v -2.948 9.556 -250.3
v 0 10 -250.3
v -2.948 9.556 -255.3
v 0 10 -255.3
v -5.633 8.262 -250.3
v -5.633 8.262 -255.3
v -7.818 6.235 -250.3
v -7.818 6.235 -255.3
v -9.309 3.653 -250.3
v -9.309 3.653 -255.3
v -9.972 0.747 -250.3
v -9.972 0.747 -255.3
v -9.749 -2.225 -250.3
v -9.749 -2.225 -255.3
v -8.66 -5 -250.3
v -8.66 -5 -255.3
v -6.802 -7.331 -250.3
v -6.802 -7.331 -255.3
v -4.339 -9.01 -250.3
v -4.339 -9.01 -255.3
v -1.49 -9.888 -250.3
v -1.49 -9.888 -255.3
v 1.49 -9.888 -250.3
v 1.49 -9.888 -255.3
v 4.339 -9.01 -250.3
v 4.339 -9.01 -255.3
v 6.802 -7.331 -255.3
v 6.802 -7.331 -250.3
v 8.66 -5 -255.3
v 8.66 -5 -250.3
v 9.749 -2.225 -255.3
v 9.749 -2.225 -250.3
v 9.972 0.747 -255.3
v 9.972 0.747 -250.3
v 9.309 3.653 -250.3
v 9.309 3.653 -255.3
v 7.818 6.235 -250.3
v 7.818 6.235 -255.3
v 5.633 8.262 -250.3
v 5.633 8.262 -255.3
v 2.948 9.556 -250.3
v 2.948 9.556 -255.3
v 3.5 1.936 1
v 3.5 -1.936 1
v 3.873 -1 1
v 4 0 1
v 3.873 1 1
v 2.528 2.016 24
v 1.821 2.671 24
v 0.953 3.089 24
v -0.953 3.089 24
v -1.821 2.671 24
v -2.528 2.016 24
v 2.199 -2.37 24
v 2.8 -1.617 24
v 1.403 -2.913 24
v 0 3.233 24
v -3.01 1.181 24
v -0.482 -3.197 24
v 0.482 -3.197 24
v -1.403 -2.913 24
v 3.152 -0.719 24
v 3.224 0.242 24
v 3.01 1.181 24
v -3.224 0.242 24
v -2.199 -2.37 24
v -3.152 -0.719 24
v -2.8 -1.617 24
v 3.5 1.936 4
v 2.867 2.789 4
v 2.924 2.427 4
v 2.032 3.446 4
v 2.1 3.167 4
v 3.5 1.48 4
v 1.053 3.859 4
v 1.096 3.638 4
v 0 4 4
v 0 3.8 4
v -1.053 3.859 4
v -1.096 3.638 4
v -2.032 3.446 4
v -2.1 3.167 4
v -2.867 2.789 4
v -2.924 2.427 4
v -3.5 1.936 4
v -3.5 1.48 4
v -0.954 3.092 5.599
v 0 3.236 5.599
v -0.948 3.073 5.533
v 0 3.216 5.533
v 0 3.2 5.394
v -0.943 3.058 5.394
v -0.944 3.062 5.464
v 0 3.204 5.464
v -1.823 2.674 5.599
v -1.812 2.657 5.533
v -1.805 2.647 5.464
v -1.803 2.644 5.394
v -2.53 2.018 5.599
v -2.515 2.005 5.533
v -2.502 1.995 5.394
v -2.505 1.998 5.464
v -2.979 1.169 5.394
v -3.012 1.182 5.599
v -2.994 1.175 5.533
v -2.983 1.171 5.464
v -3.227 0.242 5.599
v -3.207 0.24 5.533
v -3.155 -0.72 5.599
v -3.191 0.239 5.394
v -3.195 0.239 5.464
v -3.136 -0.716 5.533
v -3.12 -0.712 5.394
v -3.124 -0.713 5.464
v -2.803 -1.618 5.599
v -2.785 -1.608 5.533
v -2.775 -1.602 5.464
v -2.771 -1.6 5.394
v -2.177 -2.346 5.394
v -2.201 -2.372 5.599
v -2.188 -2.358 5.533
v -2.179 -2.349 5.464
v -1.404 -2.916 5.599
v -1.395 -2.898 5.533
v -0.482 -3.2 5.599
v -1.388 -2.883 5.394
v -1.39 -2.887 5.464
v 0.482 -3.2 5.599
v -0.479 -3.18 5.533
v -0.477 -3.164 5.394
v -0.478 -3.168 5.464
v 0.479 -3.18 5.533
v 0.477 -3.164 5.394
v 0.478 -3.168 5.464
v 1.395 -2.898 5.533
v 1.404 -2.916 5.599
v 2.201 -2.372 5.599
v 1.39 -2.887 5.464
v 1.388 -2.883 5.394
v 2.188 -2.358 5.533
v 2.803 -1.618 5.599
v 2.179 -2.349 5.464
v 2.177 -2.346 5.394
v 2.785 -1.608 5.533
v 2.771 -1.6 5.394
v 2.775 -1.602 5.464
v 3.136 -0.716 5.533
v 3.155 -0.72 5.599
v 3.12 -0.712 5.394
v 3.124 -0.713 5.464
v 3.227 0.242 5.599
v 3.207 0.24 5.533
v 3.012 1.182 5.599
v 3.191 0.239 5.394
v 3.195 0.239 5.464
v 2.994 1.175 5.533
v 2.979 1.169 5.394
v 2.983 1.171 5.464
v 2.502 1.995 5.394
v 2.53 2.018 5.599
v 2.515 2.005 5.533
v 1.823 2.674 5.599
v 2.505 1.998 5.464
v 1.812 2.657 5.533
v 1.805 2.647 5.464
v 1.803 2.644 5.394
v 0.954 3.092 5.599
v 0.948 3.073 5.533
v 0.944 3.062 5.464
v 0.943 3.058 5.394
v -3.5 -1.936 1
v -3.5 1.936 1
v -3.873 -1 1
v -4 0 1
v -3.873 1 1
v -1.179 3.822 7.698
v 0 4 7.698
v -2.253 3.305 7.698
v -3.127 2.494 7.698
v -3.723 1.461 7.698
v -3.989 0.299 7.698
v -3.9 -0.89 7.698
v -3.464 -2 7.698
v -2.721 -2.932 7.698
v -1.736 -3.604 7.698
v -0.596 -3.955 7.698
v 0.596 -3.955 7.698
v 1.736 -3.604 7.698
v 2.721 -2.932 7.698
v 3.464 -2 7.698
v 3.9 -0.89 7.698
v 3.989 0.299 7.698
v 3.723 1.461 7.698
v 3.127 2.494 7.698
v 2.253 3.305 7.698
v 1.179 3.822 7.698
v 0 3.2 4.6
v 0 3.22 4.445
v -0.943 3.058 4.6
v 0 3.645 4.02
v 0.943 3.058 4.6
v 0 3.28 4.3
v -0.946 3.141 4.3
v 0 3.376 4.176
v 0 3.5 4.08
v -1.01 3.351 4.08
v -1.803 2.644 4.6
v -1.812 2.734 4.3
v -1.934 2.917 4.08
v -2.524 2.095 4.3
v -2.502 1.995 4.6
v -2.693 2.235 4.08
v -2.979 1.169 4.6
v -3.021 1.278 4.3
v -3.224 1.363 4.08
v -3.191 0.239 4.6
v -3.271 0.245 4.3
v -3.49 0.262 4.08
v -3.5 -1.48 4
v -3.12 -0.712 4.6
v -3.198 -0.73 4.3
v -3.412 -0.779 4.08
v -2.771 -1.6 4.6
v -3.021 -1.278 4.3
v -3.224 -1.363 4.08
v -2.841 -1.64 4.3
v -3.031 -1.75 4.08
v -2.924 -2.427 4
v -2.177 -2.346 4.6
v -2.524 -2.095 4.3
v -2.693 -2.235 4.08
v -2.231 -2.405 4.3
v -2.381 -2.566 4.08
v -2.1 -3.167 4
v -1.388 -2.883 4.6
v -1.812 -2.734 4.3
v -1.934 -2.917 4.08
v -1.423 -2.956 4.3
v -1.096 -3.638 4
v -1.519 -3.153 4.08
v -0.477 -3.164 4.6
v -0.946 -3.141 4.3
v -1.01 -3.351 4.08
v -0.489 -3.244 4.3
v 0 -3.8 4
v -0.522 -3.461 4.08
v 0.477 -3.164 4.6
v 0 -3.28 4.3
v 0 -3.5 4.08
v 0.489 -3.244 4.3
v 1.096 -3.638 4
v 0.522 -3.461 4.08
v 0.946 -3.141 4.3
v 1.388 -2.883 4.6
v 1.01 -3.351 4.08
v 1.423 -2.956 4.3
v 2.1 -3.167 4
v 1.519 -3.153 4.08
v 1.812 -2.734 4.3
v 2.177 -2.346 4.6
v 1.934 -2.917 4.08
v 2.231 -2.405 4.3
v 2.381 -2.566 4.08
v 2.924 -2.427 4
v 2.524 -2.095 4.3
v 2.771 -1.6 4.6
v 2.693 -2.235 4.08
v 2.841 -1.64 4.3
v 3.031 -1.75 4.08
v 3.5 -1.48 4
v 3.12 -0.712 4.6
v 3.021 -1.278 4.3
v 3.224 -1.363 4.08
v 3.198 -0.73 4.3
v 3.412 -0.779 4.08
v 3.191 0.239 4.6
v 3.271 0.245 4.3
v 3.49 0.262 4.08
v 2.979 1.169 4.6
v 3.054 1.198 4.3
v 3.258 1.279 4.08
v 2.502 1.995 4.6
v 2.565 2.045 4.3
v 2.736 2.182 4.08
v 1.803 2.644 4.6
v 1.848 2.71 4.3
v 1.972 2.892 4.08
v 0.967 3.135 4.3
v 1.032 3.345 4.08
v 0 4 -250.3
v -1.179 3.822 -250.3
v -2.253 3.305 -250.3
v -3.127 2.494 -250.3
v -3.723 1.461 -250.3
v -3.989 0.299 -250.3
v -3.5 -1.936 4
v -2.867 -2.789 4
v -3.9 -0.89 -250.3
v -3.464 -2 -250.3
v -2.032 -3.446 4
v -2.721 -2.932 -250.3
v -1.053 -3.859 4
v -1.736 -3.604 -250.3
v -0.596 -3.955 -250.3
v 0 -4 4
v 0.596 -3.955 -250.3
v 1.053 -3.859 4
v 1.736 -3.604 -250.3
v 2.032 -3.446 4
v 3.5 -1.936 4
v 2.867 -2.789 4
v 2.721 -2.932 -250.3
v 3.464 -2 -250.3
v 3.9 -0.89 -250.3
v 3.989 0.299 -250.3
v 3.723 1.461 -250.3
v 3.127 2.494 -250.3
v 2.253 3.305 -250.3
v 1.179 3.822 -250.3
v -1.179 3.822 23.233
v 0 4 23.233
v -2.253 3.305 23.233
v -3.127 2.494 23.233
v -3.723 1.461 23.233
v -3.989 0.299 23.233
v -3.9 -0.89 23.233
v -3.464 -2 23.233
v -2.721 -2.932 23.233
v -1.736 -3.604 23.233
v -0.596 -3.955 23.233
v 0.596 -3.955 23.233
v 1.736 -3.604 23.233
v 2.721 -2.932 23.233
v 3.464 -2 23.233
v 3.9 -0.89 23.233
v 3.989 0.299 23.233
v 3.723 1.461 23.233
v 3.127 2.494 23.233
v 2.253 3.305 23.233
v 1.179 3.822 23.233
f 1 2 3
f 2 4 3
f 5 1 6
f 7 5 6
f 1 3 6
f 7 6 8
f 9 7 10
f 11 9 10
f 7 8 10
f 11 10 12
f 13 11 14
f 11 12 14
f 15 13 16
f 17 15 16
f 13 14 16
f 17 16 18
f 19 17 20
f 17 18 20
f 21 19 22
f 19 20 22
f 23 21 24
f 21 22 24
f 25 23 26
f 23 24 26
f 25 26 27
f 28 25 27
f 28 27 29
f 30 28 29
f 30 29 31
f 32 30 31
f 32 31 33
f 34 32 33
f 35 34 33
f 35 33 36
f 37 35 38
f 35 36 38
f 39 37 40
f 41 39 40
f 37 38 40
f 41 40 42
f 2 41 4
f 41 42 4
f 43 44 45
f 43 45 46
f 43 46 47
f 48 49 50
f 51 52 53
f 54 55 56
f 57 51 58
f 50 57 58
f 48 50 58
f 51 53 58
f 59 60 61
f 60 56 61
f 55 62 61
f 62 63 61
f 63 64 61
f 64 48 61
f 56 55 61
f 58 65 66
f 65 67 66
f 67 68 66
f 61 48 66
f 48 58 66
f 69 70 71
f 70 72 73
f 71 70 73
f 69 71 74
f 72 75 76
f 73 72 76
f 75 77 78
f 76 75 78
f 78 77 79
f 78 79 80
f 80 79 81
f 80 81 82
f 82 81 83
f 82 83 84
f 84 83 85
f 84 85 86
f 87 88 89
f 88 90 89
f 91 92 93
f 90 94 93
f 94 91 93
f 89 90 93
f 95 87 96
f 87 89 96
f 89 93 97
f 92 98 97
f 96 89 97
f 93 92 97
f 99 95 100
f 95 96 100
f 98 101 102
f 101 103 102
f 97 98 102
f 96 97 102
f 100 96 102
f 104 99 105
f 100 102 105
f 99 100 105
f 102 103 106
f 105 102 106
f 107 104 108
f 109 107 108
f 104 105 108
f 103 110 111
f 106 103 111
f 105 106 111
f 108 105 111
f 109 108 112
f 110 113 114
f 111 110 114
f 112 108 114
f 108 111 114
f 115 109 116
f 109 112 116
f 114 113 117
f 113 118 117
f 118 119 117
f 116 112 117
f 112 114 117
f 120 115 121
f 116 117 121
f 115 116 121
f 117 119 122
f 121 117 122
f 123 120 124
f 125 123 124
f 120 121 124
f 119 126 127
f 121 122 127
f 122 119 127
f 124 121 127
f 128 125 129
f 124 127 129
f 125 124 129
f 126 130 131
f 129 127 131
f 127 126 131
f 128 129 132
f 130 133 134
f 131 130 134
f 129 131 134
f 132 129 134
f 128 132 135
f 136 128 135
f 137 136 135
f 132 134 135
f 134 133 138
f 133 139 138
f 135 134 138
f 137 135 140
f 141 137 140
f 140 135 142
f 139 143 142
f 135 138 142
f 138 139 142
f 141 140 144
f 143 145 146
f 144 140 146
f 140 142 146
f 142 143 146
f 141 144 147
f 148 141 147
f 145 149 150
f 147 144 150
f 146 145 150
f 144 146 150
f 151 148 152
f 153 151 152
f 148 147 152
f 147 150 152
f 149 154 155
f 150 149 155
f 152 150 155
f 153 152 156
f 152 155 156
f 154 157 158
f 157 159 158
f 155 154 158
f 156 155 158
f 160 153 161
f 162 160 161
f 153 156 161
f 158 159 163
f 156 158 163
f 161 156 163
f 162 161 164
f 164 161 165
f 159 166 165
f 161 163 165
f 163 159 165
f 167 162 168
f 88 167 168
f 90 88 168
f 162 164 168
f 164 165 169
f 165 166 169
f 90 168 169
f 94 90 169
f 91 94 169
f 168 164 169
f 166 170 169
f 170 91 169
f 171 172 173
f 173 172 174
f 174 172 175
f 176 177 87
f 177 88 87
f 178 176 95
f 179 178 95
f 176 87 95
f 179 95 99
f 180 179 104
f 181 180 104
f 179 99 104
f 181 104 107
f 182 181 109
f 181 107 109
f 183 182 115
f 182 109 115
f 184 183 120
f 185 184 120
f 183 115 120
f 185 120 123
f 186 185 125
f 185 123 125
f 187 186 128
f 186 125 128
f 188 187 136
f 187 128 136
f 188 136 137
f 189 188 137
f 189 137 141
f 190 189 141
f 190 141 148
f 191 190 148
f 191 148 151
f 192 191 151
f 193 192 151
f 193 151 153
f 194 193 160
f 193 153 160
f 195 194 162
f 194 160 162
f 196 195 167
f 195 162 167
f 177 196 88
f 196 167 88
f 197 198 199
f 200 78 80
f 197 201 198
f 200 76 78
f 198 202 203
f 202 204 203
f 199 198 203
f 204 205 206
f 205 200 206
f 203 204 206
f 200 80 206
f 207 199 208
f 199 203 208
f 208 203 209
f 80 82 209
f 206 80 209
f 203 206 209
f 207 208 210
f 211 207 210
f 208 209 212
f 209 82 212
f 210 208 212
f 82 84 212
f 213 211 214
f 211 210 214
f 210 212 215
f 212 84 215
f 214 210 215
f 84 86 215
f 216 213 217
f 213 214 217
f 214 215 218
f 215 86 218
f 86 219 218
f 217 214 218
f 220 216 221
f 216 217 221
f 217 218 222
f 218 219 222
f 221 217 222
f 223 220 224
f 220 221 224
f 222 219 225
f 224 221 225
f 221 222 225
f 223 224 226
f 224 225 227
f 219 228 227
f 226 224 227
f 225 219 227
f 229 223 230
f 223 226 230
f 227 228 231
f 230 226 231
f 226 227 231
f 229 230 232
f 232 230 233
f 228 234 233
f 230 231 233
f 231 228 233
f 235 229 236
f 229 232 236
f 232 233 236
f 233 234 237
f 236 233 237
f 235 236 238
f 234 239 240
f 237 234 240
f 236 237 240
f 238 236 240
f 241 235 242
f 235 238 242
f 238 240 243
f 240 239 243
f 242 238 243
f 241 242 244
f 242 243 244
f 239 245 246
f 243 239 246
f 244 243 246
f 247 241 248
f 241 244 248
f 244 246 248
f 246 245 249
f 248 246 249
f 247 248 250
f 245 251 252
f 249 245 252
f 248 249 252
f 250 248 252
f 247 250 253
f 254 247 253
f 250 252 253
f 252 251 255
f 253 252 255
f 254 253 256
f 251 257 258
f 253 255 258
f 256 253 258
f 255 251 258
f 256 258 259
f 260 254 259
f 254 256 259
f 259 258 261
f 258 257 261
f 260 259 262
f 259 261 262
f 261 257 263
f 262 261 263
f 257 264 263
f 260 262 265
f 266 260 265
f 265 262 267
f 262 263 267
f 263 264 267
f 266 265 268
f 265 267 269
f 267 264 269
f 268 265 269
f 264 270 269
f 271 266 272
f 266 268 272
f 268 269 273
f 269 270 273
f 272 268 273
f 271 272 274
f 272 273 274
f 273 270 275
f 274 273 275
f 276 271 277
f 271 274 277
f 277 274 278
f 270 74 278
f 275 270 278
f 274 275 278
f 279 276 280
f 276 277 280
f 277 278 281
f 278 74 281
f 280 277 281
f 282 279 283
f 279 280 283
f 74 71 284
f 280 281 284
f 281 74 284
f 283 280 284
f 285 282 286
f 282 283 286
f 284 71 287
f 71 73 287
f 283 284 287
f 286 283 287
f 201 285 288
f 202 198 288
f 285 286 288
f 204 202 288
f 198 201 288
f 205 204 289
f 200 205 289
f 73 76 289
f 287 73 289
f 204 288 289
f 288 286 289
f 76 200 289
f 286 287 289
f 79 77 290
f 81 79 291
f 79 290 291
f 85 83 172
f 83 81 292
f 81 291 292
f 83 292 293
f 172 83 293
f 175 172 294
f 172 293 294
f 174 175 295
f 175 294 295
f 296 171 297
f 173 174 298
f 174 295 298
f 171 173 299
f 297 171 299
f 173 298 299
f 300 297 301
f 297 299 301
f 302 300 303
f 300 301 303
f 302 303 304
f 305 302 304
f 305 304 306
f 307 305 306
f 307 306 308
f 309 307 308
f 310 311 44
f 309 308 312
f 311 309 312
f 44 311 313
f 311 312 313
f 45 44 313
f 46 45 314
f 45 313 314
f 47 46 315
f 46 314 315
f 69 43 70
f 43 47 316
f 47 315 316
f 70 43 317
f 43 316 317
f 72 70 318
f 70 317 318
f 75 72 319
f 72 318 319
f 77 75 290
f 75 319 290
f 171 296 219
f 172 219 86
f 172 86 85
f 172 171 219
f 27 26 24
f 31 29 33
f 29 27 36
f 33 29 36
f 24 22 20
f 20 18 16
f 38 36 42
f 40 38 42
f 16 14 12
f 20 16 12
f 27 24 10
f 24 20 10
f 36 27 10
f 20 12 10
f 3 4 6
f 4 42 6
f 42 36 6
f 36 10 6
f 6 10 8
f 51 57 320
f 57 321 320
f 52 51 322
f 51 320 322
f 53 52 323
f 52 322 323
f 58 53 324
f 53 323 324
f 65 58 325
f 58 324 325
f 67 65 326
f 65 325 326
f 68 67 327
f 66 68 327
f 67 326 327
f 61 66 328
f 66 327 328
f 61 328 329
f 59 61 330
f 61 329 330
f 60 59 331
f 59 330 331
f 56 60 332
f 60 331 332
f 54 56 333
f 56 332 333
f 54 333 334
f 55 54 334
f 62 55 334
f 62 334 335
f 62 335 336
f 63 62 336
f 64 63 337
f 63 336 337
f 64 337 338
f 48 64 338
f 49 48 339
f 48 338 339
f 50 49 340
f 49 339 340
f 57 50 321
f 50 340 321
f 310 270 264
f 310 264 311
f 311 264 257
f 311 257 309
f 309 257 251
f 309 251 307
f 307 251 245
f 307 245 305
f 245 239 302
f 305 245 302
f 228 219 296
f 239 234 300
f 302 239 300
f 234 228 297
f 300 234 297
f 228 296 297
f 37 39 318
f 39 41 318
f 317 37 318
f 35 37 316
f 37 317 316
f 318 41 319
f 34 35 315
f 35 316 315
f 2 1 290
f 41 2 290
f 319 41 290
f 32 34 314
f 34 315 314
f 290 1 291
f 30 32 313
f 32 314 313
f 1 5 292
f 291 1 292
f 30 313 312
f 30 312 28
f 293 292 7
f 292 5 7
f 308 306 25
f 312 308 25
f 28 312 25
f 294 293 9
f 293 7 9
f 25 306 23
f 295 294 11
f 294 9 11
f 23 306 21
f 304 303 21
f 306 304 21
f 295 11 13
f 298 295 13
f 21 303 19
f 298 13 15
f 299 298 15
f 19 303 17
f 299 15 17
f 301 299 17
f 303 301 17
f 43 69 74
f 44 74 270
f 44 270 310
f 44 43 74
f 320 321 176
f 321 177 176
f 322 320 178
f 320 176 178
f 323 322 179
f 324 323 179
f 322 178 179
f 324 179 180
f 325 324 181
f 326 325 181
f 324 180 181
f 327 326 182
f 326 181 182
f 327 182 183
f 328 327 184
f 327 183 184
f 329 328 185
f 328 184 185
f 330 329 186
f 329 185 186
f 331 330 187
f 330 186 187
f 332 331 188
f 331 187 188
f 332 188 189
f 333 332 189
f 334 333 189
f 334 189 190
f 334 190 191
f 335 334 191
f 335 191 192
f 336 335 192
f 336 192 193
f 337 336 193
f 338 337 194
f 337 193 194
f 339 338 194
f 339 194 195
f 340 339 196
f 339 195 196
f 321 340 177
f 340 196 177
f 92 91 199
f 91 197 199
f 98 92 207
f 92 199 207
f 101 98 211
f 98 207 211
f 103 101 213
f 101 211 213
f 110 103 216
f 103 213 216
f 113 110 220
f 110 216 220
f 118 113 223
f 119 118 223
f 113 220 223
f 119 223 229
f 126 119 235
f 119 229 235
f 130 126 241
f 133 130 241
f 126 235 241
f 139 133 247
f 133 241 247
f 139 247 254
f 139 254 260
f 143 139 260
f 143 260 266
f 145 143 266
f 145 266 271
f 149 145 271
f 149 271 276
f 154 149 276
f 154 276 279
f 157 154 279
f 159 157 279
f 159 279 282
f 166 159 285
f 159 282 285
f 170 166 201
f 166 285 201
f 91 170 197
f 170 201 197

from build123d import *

# Parameters (mm, degrees)
SCHNITT_LINEAR_AUSTRAGEN1_DEPTH = 4


with BuildPart() as part:
    # Skizze1 → Rotation1 (revolve)
    with BuildSketch(Plane(origin=(0, 0, 0), x_dir=(0, 0, -1), z_dir=(1, 0, 0))):
        Polygon((-4, 0), (-4, 4), (250.3, 4), (250.3, 10), (255.3, 10), (255.3, 0), align=None)
    revolve(axis=Axis((0, 0, -255.3), (0, 0, 1)))

    # Skizze2 → Rotation2 (revolve)
    with BuildSketch(Plane(origin=(0, 0, 0), x_dir=(0, 0, -1), z_dir=(1, 0, 0))):
        with BuildLine():
            Line((-24, 0), (-24, 3.233))
            Line((-24, 3.233), (-23.233, 4))
            Line((-23.233, 4), (-7.697981936, 4))
            Line((-7.697981936, 4), (-5.599415898, 3.236184428))
            ThreePointArc((-5.599415898, 3.236184428), (-5.498392718, 3.209115348), (-5.394203812, 3.2))
            Line((-5.394203812, 3.2), (-4.6, 3.2))
            ThreePointArc((-4.6, 3.2), (-4.175735931, 3.375735931), (-4, 3.8))
            Line((-4, 3.8), (-4, 4))
            Line((-4, 4), (-3, 4))
            Line((-3, 4), (-3, 0))
            Line((-3, 0), (-24, 0))
        make_face()
    revolve(axis=Axis((0, 0, 3), (0, 0, 1)))

    # Skizze3 → Schnitt-Linear austragen1 (cut)
    with BuildSketch(Plane.XY.offset(1)):
        Polygon((-7, 14), (-7, -7), (-3.5, -7), (-3.5, 7), (3.5, 7), (3.5, -7), (7, -7), (7, 14), align=None)
    extrude(amount=SCHNITT_LINEAR_AUSTRAGEN1_DEPTH, mode=Mode.SUBTRACT)


solid = part.part
